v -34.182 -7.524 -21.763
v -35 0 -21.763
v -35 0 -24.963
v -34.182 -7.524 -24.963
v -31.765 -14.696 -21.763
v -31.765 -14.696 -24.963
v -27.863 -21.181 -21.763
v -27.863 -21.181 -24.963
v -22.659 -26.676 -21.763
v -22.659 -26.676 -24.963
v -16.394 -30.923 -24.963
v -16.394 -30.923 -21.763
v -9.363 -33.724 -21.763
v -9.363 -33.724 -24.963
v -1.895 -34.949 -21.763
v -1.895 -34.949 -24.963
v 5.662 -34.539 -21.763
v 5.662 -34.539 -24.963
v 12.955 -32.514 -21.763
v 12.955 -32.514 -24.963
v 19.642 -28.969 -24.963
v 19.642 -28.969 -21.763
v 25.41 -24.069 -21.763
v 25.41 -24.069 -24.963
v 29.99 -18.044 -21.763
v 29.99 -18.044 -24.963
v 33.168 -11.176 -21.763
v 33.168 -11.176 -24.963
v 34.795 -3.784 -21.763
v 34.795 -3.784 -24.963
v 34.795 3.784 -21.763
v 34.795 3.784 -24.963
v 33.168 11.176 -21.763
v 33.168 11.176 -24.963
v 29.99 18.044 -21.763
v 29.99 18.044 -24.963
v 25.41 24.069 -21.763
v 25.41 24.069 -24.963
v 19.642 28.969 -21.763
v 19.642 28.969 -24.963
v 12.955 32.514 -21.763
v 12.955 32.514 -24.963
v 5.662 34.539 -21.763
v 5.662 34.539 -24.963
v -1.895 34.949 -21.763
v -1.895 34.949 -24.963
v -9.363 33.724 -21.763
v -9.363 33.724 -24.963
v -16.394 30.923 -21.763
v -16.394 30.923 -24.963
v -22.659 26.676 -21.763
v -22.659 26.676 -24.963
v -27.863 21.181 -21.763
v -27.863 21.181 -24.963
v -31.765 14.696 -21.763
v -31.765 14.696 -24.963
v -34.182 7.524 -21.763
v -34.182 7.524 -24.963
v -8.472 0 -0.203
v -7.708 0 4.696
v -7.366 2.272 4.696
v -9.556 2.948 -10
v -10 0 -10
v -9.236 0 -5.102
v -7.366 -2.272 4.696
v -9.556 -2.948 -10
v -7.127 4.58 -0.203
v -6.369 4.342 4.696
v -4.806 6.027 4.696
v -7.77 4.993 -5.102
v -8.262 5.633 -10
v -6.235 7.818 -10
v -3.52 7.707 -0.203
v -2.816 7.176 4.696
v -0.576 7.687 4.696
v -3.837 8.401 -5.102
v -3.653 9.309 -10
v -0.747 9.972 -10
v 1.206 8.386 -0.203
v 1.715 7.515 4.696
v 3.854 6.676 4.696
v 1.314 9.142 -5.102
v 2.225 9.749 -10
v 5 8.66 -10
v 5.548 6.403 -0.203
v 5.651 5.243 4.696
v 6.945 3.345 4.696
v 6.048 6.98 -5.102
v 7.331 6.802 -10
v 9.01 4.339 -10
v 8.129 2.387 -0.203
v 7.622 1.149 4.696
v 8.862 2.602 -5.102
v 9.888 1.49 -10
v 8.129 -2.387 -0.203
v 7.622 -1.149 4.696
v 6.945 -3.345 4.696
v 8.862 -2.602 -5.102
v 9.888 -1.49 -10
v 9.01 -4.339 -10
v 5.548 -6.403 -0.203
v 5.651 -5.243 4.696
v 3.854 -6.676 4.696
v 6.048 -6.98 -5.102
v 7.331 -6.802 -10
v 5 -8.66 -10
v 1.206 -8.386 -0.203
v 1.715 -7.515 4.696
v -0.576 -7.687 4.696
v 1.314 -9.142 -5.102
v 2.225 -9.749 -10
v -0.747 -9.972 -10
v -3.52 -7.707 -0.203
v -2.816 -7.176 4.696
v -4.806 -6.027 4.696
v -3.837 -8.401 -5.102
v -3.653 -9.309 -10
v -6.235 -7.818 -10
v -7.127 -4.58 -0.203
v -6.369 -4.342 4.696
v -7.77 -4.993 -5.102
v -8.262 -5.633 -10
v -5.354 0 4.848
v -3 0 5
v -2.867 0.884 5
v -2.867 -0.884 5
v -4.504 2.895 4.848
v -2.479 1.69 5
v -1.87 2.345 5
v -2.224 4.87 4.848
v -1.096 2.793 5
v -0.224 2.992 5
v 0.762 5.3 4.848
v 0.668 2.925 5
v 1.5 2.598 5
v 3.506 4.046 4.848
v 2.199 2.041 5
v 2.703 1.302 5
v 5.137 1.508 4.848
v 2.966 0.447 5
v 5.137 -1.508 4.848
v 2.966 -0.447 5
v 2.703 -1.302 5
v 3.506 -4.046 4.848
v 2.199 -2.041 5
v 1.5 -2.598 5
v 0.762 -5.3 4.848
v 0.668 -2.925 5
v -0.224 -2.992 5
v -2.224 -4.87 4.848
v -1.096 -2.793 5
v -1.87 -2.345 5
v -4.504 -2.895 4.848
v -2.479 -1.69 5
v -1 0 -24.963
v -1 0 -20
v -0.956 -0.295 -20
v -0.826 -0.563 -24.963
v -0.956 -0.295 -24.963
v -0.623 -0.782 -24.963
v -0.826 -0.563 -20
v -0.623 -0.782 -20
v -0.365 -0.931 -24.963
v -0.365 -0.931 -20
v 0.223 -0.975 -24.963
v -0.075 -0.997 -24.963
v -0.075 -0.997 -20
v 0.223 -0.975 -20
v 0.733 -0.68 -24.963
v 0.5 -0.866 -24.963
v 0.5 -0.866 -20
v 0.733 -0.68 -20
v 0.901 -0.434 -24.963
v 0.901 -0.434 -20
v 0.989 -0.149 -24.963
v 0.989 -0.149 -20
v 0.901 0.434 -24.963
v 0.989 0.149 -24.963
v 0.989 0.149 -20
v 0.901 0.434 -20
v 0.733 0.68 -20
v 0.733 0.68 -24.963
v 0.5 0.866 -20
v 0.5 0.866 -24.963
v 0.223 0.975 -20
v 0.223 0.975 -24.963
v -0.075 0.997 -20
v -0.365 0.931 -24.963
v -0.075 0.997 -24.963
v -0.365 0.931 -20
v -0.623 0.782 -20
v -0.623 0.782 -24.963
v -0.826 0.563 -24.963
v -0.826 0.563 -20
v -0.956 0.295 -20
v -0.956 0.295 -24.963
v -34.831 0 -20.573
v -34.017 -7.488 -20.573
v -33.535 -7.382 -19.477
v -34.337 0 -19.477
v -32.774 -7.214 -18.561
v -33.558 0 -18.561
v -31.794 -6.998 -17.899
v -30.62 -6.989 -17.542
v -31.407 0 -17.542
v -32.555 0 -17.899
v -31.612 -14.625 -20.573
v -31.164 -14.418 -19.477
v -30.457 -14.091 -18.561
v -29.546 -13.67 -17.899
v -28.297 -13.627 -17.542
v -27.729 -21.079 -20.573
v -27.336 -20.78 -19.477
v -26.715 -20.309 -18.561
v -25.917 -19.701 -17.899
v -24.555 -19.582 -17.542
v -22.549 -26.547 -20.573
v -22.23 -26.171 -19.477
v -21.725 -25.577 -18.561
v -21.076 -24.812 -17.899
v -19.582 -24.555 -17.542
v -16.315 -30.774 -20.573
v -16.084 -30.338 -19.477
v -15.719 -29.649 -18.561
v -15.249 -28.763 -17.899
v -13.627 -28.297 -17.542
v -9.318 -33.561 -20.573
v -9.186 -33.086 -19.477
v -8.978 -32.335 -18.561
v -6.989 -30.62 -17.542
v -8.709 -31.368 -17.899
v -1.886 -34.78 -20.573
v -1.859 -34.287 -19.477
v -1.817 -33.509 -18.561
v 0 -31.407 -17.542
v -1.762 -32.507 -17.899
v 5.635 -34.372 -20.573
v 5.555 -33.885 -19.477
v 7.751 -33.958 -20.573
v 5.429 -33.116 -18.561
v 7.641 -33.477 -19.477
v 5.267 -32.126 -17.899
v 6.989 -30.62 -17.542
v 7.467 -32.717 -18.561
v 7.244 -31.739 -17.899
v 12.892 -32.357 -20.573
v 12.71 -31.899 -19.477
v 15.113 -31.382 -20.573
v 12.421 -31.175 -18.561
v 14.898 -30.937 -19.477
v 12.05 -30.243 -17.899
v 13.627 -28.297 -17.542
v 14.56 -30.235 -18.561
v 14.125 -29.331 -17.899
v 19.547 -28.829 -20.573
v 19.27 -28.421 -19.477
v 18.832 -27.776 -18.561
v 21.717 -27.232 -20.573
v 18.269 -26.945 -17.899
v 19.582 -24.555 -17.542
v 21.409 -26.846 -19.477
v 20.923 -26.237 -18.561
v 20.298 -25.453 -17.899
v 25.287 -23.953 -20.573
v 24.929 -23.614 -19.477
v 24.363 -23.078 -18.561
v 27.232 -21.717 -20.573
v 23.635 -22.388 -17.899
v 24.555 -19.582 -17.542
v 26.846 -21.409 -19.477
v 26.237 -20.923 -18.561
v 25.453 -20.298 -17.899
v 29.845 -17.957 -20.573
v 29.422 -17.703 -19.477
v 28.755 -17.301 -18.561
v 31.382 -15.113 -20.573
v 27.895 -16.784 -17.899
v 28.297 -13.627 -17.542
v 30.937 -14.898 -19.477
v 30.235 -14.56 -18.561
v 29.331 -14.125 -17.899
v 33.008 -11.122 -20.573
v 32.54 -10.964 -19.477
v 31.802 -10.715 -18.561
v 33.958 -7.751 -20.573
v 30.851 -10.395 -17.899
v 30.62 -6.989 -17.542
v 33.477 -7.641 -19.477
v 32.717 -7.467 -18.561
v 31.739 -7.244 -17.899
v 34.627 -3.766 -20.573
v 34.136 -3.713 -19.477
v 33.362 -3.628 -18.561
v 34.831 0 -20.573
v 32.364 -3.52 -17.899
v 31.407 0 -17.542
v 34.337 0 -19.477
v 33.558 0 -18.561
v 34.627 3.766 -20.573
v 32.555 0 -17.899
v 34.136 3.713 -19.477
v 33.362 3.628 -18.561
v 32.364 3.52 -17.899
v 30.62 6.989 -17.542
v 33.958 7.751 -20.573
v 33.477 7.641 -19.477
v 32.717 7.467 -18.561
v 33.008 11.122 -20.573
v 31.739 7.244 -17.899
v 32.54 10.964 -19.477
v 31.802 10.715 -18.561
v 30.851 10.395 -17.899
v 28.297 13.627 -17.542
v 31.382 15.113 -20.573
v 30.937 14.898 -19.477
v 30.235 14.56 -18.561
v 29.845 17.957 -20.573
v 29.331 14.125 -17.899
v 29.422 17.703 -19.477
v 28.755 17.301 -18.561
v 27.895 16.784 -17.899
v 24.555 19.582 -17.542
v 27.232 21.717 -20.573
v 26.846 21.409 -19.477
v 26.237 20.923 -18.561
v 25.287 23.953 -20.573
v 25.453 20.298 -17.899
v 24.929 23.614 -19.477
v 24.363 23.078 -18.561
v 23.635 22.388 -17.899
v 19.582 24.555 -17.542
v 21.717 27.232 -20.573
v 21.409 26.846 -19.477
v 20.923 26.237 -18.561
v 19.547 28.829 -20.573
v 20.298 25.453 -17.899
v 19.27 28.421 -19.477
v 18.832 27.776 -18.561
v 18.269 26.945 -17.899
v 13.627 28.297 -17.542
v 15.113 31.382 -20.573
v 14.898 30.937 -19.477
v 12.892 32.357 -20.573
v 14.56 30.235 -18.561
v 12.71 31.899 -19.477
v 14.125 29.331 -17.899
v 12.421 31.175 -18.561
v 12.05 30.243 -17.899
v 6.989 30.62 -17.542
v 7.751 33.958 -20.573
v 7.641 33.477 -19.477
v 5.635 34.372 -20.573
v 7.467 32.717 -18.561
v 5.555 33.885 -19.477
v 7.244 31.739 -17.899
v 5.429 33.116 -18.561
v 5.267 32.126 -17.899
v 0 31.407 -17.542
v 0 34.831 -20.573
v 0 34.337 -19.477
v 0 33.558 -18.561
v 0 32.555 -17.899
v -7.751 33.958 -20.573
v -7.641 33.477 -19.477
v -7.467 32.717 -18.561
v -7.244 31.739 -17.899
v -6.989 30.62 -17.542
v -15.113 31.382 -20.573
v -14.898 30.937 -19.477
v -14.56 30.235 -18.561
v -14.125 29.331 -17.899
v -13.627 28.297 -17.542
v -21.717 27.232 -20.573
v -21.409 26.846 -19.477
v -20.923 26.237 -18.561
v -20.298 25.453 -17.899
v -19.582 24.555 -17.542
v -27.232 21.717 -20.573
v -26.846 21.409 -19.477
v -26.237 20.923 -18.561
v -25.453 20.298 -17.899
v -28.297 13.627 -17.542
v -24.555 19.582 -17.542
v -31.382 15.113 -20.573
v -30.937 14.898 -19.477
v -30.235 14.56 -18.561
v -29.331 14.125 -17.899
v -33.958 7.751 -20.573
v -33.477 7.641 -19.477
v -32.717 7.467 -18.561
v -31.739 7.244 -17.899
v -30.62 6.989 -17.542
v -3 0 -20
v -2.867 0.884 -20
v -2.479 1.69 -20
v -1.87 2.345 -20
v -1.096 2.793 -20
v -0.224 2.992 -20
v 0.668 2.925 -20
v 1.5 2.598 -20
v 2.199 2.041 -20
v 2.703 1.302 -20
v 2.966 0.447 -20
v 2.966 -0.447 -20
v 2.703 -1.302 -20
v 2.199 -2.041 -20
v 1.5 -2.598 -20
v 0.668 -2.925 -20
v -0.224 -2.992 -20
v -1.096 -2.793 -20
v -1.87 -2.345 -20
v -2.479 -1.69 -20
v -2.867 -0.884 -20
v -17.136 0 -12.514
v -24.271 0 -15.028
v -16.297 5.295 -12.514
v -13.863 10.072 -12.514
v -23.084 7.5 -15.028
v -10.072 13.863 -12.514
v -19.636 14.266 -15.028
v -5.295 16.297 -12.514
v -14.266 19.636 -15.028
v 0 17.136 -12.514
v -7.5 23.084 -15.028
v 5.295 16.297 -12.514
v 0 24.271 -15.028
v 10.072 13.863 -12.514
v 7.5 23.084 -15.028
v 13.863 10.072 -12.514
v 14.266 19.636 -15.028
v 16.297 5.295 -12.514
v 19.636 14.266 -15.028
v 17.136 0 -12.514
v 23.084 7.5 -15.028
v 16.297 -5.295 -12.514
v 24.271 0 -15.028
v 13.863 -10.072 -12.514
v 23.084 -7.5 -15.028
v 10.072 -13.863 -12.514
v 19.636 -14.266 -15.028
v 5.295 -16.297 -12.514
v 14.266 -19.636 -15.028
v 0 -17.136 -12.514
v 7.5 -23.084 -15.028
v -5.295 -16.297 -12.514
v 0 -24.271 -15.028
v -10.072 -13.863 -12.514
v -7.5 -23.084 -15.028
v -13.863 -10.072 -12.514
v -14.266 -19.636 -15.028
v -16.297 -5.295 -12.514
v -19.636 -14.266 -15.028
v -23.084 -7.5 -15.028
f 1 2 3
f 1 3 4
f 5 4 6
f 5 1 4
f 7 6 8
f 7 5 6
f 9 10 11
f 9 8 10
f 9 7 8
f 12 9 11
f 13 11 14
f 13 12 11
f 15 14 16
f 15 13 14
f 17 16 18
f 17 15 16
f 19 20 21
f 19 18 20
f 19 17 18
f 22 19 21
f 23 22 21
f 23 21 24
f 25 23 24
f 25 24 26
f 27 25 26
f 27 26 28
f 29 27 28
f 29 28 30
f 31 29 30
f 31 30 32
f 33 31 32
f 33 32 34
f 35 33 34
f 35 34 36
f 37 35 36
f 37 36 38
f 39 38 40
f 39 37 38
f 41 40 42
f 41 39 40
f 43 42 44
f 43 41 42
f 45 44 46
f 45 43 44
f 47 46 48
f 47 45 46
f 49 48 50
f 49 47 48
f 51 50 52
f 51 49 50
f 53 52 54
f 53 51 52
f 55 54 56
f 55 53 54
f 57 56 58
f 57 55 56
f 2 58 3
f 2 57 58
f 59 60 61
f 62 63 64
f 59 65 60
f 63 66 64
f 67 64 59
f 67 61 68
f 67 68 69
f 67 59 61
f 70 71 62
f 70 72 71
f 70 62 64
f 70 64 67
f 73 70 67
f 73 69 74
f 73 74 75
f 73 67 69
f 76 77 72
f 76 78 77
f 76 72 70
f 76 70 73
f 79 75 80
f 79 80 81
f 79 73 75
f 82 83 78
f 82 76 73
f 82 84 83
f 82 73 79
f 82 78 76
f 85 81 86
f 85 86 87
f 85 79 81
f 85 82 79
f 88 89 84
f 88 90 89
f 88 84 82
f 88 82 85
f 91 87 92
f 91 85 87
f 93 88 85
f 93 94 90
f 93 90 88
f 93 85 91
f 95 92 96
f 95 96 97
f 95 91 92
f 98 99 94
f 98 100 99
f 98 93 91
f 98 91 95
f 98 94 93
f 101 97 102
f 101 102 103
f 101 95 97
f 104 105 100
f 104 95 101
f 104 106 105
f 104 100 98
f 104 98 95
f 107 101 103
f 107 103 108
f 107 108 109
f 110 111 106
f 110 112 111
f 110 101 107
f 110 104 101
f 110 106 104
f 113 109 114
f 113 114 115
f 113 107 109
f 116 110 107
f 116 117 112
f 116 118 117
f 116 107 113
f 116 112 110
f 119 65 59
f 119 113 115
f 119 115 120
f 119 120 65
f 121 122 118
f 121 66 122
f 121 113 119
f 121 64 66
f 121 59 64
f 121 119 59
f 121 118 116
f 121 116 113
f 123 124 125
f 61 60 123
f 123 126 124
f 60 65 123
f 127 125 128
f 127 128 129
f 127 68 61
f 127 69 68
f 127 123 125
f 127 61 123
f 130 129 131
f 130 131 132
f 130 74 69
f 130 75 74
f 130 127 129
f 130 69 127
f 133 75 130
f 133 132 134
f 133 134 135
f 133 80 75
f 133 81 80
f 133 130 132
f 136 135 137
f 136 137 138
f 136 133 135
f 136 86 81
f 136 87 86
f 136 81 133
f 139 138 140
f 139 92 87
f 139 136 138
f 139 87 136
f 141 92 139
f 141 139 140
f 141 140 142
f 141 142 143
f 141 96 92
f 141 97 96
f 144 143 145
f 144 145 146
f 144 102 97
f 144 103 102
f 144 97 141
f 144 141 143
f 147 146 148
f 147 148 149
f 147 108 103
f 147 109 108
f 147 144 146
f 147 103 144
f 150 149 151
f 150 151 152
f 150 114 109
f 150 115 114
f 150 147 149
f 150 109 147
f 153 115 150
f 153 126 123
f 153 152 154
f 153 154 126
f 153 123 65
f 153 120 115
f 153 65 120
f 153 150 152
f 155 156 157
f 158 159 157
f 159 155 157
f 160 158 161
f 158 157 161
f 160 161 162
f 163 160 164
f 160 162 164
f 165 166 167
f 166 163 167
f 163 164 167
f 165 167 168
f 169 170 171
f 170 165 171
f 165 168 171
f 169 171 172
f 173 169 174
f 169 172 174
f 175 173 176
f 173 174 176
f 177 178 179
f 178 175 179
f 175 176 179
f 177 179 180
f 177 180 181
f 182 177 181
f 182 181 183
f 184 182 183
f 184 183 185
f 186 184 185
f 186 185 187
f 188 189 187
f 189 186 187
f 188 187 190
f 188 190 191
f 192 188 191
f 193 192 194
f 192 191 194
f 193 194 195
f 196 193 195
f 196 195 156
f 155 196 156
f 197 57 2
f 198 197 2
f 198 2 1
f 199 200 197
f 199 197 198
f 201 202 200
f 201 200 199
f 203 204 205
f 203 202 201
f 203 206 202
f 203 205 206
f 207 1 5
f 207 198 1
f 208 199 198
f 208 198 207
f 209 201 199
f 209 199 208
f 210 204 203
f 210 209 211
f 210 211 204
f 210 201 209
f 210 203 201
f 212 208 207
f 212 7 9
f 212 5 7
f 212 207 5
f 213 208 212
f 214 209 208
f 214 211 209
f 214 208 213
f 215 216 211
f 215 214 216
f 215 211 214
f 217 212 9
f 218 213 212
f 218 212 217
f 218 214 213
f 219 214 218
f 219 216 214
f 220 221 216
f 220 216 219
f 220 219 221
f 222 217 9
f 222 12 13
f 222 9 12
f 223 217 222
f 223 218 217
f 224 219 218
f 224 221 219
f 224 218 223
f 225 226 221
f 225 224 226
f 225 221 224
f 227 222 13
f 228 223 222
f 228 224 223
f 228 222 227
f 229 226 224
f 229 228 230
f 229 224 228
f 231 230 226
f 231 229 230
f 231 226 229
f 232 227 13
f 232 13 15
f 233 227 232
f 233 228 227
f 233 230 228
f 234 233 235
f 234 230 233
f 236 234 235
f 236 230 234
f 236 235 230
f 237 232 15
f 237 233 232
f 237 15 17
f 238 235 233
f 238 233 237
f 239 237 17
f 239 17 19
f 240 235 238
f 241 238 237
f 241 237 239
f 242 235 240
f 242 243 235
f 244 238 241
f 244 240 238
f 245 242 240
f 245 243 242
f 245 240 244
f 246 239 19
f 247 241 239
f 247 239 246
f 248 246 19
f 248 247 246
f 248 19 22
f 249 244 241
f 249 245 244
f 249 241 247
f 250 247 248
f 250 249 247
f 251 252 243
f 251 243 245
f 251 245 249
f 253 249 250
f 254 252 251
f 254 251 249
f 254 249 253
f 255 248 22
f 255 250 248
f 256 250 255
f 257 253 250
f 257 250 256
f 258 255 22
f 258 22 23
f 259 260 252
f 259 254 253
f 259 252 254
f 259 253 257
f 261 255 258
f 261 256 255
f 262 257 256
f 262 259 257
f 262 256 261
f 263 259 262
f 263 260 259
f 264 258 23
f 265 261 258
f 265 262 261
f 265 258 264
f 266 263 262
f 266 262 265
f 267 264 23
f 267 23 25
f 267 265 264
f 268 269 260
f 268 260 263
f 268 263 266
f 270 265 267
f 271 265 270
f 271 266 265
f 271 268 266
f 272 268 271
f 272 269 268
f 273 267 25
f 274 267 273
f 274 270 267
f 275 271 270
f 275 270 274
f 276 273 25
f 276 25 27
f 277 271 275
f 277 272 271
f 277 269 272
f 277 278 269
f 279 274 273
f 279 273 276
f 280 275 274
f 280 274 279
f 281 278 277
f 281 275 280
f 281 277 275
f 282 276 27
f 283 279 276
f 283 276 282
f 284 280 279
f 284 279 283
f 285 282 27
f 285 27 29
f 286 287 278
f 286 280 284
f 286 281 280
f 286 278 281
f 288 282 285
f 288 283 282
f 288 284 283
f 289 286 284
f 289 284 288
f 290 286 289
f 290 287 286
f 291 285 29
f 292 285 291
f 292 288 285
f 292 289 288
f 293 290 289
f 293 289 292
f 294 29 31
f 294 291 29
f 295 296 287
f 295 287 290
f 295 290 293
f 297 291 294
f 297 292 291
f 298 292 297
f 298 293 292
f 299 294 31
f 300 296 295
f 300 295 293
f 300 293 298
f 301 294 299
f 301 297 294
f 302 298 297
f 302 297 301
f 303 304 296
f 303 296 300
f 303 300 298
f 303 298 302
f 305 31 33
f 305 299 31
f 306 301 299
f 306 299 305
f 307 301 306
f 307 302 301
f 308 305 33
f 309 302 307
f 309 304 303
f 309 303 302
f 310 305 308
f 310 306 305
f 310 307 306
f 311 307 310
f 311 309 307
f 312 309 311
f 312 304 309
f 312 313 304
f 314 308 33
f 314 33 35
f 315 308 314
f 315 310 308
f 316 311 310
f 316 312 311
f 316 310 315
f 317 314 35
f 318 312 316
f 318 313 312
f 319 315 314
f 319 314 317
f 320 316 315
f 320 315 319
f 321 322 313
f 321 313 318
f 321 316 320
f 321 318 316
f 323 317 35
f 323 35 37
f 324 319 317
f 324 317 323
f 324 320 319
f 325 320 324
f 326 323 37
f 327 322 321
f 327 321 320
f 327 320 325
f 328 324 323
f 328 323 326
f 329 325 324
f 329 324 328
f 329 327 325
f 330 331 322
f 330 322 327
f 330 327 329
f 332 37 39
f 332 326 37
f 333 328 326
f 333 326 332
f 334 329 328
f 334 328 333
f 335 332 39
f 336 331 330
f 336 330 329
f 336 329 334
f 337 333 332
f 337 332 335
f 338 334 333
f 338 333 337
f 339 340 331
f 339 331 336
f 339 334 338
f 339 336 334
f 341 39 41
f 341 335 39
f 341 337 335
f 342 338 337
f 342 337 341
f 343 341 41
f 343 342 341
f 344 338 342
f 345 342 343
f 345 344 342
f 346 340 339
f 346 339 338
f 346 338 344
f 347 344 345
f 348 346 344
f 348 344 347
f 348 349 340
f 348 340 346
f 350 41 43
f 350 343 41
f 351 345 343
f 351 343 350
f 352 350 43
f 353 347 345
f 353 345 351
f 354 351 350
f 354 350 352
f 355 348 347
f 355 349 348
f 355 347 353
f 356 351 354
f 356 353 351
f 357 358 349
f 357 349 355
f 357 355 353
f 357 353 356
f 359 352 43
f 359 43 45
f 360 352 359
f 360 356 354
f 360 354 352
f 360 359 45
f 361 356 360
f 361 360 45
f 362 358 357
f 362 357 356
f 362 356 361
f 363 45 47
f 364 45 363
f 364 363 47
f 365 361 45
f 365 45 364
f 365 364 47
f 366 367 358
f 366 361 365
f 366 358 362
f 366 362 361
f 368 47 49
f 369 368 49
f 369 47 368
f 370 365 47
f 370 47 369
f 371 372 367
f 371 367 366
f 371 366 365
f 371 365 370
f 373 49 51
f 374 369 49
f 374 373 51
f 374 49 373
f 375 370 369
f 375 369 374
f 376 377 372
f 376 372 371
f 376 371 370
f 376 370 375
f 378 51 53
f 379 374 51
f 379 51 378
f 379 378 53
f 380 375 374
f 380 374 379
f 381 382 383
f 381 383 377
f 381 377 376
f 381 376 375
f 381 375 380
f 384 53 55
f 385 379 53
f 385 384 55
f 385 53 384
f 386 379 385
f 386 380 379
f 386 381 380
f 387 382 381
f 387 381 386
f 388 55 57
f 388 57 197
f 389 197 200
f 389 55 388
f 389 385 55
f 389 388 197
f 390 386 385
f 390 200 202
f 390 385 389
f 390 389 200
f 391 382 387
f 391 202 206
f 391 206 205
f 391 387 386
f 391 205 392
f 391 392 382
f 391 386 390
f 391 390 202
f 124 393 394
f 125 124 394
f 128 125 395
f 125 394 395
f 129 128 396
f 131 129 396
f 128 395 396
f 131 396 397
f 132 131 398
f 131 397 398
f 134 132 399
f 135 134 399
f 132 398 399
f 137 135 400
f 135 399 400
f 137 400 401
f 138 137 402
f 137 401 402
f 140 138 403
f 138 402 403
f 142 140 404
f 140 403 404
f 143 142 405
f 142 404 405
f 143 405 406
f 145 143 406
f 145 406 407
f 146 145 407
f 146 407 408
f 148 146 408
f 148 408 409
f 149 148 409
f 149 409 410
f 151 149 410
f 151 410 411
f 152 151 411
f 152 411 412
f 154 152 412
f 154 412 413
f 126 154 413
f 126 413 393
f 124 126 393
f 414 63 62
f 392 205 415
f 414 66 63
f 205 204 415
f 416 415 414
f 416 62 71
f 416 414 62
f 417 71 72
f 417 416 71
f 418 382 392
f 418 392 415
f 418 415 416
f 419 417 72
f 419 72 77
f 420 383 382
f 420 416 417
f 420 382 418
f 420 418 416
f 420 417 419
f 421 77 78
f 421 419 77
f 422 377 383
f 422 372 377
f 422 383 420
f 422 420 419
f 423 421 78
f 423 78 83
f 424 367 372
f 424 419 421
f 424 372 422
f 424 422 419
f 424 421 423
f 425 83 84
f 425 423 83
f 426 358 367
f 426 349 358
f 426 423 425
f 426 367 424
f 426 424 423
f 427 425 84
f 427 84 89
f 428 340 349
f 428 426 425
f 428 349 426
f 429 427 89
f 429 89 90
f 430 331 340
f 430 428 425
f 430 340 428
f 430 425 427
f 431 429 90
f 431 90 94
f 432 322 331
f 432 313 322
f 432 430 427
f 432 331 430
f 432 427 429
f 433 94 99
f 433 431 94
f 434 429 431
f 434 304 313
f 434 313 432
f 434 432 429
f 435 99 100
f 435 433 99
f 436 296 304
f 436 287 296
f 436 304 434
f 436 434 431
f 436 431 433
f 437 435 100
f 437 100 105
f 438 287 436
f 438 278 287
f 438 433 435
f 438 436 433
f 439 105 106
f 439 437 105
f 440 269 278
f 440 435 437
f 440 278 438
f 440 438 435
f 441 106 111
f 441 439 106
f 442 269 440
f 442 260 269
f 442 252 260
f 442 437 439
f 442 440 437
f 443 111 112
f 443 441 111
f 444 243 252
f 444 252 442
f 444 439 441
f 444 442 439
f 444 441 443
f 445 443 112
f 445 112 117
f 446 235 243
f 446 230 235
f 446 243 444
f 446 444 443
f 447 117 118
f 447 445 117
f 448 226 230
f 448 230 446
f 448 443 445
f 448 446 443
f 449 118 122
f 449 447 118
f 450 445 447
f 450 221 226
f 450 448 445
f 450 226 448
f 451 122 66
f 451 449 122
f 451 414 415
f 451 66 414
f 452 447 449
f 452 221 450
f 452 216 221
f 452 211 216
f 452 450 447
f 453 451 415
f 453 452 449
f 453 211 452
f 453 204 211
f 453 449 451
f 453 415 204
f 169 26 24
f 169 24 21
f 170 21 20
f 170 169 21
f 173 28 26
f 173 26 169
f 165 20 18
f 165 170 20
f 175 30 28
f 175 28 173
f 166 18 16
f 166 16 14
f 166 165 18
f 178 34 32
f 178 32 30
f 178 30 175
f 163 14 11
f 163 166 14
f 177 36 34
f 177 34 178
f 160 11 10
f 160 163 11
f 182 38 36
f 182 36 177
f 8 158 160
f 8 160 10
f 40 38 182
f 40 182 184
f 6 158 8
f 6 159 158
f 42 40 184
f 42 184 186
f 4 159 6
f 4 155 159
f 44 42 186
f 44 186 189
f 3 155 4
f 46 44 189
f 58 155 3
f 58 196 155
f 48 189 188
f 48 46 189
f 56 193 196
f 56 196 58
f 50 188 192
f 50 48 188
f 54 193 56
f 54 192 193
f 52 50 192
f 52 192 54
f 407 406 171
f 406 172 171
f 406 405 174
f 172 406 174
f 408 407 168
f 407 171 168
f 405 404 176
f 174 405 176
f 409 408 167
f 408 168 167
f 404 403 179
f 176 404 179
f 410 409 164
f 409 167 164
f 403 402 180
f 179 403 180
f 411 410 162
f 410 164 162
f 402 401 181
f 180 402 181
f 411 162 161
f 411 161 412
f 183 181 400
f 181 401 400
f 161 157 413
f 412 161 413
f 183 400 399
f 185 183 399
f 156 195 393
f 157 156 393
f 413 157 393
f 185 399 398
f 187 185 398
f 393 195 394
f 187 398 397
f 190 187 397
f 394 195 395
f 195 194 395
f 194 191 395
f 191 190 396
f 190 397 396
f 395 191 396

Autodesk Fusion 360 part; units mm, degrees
sketch "Sketch1" plane through (0, 0, 0) normal (0, 1, 0) x (1, 0, 0)
  line L0 (0, -65) -> (0, 55)
  line L1 (-35, 24.9628) -> (-1, 24.9628)
  line L2 (-35, 24.9628) -> (-35, 21.7628)
  arc A0 (-35, 21.7628) -> (-31.4072, 17.5424) centre (-30.7249, 21.7628) ccw
  line L3 (-31.4072, 17.5424) -> (-10, 10)
  line L4 (-10, 10) -> (-7.7084, -4.6955)
  line L5 (0, -5) -> (-3, -5) construction
  line L6 (-7.7084, -4.6955) -> (-3, -5)
  line L7 (-3, -5) -> (-3, 20)
  line L8 (-1, 24.9628) -> (-1, 20)
  line L9 (-1, 20) -> (-3, 20)
  dimension "d1" = 34
  dimension "d2" = 3.2
  dimension "d3" = 3
revolve "Revolve1" add sketch "Sketch1" angle 360 about axis through (0, 0, 65) along (0, 0, -1)
